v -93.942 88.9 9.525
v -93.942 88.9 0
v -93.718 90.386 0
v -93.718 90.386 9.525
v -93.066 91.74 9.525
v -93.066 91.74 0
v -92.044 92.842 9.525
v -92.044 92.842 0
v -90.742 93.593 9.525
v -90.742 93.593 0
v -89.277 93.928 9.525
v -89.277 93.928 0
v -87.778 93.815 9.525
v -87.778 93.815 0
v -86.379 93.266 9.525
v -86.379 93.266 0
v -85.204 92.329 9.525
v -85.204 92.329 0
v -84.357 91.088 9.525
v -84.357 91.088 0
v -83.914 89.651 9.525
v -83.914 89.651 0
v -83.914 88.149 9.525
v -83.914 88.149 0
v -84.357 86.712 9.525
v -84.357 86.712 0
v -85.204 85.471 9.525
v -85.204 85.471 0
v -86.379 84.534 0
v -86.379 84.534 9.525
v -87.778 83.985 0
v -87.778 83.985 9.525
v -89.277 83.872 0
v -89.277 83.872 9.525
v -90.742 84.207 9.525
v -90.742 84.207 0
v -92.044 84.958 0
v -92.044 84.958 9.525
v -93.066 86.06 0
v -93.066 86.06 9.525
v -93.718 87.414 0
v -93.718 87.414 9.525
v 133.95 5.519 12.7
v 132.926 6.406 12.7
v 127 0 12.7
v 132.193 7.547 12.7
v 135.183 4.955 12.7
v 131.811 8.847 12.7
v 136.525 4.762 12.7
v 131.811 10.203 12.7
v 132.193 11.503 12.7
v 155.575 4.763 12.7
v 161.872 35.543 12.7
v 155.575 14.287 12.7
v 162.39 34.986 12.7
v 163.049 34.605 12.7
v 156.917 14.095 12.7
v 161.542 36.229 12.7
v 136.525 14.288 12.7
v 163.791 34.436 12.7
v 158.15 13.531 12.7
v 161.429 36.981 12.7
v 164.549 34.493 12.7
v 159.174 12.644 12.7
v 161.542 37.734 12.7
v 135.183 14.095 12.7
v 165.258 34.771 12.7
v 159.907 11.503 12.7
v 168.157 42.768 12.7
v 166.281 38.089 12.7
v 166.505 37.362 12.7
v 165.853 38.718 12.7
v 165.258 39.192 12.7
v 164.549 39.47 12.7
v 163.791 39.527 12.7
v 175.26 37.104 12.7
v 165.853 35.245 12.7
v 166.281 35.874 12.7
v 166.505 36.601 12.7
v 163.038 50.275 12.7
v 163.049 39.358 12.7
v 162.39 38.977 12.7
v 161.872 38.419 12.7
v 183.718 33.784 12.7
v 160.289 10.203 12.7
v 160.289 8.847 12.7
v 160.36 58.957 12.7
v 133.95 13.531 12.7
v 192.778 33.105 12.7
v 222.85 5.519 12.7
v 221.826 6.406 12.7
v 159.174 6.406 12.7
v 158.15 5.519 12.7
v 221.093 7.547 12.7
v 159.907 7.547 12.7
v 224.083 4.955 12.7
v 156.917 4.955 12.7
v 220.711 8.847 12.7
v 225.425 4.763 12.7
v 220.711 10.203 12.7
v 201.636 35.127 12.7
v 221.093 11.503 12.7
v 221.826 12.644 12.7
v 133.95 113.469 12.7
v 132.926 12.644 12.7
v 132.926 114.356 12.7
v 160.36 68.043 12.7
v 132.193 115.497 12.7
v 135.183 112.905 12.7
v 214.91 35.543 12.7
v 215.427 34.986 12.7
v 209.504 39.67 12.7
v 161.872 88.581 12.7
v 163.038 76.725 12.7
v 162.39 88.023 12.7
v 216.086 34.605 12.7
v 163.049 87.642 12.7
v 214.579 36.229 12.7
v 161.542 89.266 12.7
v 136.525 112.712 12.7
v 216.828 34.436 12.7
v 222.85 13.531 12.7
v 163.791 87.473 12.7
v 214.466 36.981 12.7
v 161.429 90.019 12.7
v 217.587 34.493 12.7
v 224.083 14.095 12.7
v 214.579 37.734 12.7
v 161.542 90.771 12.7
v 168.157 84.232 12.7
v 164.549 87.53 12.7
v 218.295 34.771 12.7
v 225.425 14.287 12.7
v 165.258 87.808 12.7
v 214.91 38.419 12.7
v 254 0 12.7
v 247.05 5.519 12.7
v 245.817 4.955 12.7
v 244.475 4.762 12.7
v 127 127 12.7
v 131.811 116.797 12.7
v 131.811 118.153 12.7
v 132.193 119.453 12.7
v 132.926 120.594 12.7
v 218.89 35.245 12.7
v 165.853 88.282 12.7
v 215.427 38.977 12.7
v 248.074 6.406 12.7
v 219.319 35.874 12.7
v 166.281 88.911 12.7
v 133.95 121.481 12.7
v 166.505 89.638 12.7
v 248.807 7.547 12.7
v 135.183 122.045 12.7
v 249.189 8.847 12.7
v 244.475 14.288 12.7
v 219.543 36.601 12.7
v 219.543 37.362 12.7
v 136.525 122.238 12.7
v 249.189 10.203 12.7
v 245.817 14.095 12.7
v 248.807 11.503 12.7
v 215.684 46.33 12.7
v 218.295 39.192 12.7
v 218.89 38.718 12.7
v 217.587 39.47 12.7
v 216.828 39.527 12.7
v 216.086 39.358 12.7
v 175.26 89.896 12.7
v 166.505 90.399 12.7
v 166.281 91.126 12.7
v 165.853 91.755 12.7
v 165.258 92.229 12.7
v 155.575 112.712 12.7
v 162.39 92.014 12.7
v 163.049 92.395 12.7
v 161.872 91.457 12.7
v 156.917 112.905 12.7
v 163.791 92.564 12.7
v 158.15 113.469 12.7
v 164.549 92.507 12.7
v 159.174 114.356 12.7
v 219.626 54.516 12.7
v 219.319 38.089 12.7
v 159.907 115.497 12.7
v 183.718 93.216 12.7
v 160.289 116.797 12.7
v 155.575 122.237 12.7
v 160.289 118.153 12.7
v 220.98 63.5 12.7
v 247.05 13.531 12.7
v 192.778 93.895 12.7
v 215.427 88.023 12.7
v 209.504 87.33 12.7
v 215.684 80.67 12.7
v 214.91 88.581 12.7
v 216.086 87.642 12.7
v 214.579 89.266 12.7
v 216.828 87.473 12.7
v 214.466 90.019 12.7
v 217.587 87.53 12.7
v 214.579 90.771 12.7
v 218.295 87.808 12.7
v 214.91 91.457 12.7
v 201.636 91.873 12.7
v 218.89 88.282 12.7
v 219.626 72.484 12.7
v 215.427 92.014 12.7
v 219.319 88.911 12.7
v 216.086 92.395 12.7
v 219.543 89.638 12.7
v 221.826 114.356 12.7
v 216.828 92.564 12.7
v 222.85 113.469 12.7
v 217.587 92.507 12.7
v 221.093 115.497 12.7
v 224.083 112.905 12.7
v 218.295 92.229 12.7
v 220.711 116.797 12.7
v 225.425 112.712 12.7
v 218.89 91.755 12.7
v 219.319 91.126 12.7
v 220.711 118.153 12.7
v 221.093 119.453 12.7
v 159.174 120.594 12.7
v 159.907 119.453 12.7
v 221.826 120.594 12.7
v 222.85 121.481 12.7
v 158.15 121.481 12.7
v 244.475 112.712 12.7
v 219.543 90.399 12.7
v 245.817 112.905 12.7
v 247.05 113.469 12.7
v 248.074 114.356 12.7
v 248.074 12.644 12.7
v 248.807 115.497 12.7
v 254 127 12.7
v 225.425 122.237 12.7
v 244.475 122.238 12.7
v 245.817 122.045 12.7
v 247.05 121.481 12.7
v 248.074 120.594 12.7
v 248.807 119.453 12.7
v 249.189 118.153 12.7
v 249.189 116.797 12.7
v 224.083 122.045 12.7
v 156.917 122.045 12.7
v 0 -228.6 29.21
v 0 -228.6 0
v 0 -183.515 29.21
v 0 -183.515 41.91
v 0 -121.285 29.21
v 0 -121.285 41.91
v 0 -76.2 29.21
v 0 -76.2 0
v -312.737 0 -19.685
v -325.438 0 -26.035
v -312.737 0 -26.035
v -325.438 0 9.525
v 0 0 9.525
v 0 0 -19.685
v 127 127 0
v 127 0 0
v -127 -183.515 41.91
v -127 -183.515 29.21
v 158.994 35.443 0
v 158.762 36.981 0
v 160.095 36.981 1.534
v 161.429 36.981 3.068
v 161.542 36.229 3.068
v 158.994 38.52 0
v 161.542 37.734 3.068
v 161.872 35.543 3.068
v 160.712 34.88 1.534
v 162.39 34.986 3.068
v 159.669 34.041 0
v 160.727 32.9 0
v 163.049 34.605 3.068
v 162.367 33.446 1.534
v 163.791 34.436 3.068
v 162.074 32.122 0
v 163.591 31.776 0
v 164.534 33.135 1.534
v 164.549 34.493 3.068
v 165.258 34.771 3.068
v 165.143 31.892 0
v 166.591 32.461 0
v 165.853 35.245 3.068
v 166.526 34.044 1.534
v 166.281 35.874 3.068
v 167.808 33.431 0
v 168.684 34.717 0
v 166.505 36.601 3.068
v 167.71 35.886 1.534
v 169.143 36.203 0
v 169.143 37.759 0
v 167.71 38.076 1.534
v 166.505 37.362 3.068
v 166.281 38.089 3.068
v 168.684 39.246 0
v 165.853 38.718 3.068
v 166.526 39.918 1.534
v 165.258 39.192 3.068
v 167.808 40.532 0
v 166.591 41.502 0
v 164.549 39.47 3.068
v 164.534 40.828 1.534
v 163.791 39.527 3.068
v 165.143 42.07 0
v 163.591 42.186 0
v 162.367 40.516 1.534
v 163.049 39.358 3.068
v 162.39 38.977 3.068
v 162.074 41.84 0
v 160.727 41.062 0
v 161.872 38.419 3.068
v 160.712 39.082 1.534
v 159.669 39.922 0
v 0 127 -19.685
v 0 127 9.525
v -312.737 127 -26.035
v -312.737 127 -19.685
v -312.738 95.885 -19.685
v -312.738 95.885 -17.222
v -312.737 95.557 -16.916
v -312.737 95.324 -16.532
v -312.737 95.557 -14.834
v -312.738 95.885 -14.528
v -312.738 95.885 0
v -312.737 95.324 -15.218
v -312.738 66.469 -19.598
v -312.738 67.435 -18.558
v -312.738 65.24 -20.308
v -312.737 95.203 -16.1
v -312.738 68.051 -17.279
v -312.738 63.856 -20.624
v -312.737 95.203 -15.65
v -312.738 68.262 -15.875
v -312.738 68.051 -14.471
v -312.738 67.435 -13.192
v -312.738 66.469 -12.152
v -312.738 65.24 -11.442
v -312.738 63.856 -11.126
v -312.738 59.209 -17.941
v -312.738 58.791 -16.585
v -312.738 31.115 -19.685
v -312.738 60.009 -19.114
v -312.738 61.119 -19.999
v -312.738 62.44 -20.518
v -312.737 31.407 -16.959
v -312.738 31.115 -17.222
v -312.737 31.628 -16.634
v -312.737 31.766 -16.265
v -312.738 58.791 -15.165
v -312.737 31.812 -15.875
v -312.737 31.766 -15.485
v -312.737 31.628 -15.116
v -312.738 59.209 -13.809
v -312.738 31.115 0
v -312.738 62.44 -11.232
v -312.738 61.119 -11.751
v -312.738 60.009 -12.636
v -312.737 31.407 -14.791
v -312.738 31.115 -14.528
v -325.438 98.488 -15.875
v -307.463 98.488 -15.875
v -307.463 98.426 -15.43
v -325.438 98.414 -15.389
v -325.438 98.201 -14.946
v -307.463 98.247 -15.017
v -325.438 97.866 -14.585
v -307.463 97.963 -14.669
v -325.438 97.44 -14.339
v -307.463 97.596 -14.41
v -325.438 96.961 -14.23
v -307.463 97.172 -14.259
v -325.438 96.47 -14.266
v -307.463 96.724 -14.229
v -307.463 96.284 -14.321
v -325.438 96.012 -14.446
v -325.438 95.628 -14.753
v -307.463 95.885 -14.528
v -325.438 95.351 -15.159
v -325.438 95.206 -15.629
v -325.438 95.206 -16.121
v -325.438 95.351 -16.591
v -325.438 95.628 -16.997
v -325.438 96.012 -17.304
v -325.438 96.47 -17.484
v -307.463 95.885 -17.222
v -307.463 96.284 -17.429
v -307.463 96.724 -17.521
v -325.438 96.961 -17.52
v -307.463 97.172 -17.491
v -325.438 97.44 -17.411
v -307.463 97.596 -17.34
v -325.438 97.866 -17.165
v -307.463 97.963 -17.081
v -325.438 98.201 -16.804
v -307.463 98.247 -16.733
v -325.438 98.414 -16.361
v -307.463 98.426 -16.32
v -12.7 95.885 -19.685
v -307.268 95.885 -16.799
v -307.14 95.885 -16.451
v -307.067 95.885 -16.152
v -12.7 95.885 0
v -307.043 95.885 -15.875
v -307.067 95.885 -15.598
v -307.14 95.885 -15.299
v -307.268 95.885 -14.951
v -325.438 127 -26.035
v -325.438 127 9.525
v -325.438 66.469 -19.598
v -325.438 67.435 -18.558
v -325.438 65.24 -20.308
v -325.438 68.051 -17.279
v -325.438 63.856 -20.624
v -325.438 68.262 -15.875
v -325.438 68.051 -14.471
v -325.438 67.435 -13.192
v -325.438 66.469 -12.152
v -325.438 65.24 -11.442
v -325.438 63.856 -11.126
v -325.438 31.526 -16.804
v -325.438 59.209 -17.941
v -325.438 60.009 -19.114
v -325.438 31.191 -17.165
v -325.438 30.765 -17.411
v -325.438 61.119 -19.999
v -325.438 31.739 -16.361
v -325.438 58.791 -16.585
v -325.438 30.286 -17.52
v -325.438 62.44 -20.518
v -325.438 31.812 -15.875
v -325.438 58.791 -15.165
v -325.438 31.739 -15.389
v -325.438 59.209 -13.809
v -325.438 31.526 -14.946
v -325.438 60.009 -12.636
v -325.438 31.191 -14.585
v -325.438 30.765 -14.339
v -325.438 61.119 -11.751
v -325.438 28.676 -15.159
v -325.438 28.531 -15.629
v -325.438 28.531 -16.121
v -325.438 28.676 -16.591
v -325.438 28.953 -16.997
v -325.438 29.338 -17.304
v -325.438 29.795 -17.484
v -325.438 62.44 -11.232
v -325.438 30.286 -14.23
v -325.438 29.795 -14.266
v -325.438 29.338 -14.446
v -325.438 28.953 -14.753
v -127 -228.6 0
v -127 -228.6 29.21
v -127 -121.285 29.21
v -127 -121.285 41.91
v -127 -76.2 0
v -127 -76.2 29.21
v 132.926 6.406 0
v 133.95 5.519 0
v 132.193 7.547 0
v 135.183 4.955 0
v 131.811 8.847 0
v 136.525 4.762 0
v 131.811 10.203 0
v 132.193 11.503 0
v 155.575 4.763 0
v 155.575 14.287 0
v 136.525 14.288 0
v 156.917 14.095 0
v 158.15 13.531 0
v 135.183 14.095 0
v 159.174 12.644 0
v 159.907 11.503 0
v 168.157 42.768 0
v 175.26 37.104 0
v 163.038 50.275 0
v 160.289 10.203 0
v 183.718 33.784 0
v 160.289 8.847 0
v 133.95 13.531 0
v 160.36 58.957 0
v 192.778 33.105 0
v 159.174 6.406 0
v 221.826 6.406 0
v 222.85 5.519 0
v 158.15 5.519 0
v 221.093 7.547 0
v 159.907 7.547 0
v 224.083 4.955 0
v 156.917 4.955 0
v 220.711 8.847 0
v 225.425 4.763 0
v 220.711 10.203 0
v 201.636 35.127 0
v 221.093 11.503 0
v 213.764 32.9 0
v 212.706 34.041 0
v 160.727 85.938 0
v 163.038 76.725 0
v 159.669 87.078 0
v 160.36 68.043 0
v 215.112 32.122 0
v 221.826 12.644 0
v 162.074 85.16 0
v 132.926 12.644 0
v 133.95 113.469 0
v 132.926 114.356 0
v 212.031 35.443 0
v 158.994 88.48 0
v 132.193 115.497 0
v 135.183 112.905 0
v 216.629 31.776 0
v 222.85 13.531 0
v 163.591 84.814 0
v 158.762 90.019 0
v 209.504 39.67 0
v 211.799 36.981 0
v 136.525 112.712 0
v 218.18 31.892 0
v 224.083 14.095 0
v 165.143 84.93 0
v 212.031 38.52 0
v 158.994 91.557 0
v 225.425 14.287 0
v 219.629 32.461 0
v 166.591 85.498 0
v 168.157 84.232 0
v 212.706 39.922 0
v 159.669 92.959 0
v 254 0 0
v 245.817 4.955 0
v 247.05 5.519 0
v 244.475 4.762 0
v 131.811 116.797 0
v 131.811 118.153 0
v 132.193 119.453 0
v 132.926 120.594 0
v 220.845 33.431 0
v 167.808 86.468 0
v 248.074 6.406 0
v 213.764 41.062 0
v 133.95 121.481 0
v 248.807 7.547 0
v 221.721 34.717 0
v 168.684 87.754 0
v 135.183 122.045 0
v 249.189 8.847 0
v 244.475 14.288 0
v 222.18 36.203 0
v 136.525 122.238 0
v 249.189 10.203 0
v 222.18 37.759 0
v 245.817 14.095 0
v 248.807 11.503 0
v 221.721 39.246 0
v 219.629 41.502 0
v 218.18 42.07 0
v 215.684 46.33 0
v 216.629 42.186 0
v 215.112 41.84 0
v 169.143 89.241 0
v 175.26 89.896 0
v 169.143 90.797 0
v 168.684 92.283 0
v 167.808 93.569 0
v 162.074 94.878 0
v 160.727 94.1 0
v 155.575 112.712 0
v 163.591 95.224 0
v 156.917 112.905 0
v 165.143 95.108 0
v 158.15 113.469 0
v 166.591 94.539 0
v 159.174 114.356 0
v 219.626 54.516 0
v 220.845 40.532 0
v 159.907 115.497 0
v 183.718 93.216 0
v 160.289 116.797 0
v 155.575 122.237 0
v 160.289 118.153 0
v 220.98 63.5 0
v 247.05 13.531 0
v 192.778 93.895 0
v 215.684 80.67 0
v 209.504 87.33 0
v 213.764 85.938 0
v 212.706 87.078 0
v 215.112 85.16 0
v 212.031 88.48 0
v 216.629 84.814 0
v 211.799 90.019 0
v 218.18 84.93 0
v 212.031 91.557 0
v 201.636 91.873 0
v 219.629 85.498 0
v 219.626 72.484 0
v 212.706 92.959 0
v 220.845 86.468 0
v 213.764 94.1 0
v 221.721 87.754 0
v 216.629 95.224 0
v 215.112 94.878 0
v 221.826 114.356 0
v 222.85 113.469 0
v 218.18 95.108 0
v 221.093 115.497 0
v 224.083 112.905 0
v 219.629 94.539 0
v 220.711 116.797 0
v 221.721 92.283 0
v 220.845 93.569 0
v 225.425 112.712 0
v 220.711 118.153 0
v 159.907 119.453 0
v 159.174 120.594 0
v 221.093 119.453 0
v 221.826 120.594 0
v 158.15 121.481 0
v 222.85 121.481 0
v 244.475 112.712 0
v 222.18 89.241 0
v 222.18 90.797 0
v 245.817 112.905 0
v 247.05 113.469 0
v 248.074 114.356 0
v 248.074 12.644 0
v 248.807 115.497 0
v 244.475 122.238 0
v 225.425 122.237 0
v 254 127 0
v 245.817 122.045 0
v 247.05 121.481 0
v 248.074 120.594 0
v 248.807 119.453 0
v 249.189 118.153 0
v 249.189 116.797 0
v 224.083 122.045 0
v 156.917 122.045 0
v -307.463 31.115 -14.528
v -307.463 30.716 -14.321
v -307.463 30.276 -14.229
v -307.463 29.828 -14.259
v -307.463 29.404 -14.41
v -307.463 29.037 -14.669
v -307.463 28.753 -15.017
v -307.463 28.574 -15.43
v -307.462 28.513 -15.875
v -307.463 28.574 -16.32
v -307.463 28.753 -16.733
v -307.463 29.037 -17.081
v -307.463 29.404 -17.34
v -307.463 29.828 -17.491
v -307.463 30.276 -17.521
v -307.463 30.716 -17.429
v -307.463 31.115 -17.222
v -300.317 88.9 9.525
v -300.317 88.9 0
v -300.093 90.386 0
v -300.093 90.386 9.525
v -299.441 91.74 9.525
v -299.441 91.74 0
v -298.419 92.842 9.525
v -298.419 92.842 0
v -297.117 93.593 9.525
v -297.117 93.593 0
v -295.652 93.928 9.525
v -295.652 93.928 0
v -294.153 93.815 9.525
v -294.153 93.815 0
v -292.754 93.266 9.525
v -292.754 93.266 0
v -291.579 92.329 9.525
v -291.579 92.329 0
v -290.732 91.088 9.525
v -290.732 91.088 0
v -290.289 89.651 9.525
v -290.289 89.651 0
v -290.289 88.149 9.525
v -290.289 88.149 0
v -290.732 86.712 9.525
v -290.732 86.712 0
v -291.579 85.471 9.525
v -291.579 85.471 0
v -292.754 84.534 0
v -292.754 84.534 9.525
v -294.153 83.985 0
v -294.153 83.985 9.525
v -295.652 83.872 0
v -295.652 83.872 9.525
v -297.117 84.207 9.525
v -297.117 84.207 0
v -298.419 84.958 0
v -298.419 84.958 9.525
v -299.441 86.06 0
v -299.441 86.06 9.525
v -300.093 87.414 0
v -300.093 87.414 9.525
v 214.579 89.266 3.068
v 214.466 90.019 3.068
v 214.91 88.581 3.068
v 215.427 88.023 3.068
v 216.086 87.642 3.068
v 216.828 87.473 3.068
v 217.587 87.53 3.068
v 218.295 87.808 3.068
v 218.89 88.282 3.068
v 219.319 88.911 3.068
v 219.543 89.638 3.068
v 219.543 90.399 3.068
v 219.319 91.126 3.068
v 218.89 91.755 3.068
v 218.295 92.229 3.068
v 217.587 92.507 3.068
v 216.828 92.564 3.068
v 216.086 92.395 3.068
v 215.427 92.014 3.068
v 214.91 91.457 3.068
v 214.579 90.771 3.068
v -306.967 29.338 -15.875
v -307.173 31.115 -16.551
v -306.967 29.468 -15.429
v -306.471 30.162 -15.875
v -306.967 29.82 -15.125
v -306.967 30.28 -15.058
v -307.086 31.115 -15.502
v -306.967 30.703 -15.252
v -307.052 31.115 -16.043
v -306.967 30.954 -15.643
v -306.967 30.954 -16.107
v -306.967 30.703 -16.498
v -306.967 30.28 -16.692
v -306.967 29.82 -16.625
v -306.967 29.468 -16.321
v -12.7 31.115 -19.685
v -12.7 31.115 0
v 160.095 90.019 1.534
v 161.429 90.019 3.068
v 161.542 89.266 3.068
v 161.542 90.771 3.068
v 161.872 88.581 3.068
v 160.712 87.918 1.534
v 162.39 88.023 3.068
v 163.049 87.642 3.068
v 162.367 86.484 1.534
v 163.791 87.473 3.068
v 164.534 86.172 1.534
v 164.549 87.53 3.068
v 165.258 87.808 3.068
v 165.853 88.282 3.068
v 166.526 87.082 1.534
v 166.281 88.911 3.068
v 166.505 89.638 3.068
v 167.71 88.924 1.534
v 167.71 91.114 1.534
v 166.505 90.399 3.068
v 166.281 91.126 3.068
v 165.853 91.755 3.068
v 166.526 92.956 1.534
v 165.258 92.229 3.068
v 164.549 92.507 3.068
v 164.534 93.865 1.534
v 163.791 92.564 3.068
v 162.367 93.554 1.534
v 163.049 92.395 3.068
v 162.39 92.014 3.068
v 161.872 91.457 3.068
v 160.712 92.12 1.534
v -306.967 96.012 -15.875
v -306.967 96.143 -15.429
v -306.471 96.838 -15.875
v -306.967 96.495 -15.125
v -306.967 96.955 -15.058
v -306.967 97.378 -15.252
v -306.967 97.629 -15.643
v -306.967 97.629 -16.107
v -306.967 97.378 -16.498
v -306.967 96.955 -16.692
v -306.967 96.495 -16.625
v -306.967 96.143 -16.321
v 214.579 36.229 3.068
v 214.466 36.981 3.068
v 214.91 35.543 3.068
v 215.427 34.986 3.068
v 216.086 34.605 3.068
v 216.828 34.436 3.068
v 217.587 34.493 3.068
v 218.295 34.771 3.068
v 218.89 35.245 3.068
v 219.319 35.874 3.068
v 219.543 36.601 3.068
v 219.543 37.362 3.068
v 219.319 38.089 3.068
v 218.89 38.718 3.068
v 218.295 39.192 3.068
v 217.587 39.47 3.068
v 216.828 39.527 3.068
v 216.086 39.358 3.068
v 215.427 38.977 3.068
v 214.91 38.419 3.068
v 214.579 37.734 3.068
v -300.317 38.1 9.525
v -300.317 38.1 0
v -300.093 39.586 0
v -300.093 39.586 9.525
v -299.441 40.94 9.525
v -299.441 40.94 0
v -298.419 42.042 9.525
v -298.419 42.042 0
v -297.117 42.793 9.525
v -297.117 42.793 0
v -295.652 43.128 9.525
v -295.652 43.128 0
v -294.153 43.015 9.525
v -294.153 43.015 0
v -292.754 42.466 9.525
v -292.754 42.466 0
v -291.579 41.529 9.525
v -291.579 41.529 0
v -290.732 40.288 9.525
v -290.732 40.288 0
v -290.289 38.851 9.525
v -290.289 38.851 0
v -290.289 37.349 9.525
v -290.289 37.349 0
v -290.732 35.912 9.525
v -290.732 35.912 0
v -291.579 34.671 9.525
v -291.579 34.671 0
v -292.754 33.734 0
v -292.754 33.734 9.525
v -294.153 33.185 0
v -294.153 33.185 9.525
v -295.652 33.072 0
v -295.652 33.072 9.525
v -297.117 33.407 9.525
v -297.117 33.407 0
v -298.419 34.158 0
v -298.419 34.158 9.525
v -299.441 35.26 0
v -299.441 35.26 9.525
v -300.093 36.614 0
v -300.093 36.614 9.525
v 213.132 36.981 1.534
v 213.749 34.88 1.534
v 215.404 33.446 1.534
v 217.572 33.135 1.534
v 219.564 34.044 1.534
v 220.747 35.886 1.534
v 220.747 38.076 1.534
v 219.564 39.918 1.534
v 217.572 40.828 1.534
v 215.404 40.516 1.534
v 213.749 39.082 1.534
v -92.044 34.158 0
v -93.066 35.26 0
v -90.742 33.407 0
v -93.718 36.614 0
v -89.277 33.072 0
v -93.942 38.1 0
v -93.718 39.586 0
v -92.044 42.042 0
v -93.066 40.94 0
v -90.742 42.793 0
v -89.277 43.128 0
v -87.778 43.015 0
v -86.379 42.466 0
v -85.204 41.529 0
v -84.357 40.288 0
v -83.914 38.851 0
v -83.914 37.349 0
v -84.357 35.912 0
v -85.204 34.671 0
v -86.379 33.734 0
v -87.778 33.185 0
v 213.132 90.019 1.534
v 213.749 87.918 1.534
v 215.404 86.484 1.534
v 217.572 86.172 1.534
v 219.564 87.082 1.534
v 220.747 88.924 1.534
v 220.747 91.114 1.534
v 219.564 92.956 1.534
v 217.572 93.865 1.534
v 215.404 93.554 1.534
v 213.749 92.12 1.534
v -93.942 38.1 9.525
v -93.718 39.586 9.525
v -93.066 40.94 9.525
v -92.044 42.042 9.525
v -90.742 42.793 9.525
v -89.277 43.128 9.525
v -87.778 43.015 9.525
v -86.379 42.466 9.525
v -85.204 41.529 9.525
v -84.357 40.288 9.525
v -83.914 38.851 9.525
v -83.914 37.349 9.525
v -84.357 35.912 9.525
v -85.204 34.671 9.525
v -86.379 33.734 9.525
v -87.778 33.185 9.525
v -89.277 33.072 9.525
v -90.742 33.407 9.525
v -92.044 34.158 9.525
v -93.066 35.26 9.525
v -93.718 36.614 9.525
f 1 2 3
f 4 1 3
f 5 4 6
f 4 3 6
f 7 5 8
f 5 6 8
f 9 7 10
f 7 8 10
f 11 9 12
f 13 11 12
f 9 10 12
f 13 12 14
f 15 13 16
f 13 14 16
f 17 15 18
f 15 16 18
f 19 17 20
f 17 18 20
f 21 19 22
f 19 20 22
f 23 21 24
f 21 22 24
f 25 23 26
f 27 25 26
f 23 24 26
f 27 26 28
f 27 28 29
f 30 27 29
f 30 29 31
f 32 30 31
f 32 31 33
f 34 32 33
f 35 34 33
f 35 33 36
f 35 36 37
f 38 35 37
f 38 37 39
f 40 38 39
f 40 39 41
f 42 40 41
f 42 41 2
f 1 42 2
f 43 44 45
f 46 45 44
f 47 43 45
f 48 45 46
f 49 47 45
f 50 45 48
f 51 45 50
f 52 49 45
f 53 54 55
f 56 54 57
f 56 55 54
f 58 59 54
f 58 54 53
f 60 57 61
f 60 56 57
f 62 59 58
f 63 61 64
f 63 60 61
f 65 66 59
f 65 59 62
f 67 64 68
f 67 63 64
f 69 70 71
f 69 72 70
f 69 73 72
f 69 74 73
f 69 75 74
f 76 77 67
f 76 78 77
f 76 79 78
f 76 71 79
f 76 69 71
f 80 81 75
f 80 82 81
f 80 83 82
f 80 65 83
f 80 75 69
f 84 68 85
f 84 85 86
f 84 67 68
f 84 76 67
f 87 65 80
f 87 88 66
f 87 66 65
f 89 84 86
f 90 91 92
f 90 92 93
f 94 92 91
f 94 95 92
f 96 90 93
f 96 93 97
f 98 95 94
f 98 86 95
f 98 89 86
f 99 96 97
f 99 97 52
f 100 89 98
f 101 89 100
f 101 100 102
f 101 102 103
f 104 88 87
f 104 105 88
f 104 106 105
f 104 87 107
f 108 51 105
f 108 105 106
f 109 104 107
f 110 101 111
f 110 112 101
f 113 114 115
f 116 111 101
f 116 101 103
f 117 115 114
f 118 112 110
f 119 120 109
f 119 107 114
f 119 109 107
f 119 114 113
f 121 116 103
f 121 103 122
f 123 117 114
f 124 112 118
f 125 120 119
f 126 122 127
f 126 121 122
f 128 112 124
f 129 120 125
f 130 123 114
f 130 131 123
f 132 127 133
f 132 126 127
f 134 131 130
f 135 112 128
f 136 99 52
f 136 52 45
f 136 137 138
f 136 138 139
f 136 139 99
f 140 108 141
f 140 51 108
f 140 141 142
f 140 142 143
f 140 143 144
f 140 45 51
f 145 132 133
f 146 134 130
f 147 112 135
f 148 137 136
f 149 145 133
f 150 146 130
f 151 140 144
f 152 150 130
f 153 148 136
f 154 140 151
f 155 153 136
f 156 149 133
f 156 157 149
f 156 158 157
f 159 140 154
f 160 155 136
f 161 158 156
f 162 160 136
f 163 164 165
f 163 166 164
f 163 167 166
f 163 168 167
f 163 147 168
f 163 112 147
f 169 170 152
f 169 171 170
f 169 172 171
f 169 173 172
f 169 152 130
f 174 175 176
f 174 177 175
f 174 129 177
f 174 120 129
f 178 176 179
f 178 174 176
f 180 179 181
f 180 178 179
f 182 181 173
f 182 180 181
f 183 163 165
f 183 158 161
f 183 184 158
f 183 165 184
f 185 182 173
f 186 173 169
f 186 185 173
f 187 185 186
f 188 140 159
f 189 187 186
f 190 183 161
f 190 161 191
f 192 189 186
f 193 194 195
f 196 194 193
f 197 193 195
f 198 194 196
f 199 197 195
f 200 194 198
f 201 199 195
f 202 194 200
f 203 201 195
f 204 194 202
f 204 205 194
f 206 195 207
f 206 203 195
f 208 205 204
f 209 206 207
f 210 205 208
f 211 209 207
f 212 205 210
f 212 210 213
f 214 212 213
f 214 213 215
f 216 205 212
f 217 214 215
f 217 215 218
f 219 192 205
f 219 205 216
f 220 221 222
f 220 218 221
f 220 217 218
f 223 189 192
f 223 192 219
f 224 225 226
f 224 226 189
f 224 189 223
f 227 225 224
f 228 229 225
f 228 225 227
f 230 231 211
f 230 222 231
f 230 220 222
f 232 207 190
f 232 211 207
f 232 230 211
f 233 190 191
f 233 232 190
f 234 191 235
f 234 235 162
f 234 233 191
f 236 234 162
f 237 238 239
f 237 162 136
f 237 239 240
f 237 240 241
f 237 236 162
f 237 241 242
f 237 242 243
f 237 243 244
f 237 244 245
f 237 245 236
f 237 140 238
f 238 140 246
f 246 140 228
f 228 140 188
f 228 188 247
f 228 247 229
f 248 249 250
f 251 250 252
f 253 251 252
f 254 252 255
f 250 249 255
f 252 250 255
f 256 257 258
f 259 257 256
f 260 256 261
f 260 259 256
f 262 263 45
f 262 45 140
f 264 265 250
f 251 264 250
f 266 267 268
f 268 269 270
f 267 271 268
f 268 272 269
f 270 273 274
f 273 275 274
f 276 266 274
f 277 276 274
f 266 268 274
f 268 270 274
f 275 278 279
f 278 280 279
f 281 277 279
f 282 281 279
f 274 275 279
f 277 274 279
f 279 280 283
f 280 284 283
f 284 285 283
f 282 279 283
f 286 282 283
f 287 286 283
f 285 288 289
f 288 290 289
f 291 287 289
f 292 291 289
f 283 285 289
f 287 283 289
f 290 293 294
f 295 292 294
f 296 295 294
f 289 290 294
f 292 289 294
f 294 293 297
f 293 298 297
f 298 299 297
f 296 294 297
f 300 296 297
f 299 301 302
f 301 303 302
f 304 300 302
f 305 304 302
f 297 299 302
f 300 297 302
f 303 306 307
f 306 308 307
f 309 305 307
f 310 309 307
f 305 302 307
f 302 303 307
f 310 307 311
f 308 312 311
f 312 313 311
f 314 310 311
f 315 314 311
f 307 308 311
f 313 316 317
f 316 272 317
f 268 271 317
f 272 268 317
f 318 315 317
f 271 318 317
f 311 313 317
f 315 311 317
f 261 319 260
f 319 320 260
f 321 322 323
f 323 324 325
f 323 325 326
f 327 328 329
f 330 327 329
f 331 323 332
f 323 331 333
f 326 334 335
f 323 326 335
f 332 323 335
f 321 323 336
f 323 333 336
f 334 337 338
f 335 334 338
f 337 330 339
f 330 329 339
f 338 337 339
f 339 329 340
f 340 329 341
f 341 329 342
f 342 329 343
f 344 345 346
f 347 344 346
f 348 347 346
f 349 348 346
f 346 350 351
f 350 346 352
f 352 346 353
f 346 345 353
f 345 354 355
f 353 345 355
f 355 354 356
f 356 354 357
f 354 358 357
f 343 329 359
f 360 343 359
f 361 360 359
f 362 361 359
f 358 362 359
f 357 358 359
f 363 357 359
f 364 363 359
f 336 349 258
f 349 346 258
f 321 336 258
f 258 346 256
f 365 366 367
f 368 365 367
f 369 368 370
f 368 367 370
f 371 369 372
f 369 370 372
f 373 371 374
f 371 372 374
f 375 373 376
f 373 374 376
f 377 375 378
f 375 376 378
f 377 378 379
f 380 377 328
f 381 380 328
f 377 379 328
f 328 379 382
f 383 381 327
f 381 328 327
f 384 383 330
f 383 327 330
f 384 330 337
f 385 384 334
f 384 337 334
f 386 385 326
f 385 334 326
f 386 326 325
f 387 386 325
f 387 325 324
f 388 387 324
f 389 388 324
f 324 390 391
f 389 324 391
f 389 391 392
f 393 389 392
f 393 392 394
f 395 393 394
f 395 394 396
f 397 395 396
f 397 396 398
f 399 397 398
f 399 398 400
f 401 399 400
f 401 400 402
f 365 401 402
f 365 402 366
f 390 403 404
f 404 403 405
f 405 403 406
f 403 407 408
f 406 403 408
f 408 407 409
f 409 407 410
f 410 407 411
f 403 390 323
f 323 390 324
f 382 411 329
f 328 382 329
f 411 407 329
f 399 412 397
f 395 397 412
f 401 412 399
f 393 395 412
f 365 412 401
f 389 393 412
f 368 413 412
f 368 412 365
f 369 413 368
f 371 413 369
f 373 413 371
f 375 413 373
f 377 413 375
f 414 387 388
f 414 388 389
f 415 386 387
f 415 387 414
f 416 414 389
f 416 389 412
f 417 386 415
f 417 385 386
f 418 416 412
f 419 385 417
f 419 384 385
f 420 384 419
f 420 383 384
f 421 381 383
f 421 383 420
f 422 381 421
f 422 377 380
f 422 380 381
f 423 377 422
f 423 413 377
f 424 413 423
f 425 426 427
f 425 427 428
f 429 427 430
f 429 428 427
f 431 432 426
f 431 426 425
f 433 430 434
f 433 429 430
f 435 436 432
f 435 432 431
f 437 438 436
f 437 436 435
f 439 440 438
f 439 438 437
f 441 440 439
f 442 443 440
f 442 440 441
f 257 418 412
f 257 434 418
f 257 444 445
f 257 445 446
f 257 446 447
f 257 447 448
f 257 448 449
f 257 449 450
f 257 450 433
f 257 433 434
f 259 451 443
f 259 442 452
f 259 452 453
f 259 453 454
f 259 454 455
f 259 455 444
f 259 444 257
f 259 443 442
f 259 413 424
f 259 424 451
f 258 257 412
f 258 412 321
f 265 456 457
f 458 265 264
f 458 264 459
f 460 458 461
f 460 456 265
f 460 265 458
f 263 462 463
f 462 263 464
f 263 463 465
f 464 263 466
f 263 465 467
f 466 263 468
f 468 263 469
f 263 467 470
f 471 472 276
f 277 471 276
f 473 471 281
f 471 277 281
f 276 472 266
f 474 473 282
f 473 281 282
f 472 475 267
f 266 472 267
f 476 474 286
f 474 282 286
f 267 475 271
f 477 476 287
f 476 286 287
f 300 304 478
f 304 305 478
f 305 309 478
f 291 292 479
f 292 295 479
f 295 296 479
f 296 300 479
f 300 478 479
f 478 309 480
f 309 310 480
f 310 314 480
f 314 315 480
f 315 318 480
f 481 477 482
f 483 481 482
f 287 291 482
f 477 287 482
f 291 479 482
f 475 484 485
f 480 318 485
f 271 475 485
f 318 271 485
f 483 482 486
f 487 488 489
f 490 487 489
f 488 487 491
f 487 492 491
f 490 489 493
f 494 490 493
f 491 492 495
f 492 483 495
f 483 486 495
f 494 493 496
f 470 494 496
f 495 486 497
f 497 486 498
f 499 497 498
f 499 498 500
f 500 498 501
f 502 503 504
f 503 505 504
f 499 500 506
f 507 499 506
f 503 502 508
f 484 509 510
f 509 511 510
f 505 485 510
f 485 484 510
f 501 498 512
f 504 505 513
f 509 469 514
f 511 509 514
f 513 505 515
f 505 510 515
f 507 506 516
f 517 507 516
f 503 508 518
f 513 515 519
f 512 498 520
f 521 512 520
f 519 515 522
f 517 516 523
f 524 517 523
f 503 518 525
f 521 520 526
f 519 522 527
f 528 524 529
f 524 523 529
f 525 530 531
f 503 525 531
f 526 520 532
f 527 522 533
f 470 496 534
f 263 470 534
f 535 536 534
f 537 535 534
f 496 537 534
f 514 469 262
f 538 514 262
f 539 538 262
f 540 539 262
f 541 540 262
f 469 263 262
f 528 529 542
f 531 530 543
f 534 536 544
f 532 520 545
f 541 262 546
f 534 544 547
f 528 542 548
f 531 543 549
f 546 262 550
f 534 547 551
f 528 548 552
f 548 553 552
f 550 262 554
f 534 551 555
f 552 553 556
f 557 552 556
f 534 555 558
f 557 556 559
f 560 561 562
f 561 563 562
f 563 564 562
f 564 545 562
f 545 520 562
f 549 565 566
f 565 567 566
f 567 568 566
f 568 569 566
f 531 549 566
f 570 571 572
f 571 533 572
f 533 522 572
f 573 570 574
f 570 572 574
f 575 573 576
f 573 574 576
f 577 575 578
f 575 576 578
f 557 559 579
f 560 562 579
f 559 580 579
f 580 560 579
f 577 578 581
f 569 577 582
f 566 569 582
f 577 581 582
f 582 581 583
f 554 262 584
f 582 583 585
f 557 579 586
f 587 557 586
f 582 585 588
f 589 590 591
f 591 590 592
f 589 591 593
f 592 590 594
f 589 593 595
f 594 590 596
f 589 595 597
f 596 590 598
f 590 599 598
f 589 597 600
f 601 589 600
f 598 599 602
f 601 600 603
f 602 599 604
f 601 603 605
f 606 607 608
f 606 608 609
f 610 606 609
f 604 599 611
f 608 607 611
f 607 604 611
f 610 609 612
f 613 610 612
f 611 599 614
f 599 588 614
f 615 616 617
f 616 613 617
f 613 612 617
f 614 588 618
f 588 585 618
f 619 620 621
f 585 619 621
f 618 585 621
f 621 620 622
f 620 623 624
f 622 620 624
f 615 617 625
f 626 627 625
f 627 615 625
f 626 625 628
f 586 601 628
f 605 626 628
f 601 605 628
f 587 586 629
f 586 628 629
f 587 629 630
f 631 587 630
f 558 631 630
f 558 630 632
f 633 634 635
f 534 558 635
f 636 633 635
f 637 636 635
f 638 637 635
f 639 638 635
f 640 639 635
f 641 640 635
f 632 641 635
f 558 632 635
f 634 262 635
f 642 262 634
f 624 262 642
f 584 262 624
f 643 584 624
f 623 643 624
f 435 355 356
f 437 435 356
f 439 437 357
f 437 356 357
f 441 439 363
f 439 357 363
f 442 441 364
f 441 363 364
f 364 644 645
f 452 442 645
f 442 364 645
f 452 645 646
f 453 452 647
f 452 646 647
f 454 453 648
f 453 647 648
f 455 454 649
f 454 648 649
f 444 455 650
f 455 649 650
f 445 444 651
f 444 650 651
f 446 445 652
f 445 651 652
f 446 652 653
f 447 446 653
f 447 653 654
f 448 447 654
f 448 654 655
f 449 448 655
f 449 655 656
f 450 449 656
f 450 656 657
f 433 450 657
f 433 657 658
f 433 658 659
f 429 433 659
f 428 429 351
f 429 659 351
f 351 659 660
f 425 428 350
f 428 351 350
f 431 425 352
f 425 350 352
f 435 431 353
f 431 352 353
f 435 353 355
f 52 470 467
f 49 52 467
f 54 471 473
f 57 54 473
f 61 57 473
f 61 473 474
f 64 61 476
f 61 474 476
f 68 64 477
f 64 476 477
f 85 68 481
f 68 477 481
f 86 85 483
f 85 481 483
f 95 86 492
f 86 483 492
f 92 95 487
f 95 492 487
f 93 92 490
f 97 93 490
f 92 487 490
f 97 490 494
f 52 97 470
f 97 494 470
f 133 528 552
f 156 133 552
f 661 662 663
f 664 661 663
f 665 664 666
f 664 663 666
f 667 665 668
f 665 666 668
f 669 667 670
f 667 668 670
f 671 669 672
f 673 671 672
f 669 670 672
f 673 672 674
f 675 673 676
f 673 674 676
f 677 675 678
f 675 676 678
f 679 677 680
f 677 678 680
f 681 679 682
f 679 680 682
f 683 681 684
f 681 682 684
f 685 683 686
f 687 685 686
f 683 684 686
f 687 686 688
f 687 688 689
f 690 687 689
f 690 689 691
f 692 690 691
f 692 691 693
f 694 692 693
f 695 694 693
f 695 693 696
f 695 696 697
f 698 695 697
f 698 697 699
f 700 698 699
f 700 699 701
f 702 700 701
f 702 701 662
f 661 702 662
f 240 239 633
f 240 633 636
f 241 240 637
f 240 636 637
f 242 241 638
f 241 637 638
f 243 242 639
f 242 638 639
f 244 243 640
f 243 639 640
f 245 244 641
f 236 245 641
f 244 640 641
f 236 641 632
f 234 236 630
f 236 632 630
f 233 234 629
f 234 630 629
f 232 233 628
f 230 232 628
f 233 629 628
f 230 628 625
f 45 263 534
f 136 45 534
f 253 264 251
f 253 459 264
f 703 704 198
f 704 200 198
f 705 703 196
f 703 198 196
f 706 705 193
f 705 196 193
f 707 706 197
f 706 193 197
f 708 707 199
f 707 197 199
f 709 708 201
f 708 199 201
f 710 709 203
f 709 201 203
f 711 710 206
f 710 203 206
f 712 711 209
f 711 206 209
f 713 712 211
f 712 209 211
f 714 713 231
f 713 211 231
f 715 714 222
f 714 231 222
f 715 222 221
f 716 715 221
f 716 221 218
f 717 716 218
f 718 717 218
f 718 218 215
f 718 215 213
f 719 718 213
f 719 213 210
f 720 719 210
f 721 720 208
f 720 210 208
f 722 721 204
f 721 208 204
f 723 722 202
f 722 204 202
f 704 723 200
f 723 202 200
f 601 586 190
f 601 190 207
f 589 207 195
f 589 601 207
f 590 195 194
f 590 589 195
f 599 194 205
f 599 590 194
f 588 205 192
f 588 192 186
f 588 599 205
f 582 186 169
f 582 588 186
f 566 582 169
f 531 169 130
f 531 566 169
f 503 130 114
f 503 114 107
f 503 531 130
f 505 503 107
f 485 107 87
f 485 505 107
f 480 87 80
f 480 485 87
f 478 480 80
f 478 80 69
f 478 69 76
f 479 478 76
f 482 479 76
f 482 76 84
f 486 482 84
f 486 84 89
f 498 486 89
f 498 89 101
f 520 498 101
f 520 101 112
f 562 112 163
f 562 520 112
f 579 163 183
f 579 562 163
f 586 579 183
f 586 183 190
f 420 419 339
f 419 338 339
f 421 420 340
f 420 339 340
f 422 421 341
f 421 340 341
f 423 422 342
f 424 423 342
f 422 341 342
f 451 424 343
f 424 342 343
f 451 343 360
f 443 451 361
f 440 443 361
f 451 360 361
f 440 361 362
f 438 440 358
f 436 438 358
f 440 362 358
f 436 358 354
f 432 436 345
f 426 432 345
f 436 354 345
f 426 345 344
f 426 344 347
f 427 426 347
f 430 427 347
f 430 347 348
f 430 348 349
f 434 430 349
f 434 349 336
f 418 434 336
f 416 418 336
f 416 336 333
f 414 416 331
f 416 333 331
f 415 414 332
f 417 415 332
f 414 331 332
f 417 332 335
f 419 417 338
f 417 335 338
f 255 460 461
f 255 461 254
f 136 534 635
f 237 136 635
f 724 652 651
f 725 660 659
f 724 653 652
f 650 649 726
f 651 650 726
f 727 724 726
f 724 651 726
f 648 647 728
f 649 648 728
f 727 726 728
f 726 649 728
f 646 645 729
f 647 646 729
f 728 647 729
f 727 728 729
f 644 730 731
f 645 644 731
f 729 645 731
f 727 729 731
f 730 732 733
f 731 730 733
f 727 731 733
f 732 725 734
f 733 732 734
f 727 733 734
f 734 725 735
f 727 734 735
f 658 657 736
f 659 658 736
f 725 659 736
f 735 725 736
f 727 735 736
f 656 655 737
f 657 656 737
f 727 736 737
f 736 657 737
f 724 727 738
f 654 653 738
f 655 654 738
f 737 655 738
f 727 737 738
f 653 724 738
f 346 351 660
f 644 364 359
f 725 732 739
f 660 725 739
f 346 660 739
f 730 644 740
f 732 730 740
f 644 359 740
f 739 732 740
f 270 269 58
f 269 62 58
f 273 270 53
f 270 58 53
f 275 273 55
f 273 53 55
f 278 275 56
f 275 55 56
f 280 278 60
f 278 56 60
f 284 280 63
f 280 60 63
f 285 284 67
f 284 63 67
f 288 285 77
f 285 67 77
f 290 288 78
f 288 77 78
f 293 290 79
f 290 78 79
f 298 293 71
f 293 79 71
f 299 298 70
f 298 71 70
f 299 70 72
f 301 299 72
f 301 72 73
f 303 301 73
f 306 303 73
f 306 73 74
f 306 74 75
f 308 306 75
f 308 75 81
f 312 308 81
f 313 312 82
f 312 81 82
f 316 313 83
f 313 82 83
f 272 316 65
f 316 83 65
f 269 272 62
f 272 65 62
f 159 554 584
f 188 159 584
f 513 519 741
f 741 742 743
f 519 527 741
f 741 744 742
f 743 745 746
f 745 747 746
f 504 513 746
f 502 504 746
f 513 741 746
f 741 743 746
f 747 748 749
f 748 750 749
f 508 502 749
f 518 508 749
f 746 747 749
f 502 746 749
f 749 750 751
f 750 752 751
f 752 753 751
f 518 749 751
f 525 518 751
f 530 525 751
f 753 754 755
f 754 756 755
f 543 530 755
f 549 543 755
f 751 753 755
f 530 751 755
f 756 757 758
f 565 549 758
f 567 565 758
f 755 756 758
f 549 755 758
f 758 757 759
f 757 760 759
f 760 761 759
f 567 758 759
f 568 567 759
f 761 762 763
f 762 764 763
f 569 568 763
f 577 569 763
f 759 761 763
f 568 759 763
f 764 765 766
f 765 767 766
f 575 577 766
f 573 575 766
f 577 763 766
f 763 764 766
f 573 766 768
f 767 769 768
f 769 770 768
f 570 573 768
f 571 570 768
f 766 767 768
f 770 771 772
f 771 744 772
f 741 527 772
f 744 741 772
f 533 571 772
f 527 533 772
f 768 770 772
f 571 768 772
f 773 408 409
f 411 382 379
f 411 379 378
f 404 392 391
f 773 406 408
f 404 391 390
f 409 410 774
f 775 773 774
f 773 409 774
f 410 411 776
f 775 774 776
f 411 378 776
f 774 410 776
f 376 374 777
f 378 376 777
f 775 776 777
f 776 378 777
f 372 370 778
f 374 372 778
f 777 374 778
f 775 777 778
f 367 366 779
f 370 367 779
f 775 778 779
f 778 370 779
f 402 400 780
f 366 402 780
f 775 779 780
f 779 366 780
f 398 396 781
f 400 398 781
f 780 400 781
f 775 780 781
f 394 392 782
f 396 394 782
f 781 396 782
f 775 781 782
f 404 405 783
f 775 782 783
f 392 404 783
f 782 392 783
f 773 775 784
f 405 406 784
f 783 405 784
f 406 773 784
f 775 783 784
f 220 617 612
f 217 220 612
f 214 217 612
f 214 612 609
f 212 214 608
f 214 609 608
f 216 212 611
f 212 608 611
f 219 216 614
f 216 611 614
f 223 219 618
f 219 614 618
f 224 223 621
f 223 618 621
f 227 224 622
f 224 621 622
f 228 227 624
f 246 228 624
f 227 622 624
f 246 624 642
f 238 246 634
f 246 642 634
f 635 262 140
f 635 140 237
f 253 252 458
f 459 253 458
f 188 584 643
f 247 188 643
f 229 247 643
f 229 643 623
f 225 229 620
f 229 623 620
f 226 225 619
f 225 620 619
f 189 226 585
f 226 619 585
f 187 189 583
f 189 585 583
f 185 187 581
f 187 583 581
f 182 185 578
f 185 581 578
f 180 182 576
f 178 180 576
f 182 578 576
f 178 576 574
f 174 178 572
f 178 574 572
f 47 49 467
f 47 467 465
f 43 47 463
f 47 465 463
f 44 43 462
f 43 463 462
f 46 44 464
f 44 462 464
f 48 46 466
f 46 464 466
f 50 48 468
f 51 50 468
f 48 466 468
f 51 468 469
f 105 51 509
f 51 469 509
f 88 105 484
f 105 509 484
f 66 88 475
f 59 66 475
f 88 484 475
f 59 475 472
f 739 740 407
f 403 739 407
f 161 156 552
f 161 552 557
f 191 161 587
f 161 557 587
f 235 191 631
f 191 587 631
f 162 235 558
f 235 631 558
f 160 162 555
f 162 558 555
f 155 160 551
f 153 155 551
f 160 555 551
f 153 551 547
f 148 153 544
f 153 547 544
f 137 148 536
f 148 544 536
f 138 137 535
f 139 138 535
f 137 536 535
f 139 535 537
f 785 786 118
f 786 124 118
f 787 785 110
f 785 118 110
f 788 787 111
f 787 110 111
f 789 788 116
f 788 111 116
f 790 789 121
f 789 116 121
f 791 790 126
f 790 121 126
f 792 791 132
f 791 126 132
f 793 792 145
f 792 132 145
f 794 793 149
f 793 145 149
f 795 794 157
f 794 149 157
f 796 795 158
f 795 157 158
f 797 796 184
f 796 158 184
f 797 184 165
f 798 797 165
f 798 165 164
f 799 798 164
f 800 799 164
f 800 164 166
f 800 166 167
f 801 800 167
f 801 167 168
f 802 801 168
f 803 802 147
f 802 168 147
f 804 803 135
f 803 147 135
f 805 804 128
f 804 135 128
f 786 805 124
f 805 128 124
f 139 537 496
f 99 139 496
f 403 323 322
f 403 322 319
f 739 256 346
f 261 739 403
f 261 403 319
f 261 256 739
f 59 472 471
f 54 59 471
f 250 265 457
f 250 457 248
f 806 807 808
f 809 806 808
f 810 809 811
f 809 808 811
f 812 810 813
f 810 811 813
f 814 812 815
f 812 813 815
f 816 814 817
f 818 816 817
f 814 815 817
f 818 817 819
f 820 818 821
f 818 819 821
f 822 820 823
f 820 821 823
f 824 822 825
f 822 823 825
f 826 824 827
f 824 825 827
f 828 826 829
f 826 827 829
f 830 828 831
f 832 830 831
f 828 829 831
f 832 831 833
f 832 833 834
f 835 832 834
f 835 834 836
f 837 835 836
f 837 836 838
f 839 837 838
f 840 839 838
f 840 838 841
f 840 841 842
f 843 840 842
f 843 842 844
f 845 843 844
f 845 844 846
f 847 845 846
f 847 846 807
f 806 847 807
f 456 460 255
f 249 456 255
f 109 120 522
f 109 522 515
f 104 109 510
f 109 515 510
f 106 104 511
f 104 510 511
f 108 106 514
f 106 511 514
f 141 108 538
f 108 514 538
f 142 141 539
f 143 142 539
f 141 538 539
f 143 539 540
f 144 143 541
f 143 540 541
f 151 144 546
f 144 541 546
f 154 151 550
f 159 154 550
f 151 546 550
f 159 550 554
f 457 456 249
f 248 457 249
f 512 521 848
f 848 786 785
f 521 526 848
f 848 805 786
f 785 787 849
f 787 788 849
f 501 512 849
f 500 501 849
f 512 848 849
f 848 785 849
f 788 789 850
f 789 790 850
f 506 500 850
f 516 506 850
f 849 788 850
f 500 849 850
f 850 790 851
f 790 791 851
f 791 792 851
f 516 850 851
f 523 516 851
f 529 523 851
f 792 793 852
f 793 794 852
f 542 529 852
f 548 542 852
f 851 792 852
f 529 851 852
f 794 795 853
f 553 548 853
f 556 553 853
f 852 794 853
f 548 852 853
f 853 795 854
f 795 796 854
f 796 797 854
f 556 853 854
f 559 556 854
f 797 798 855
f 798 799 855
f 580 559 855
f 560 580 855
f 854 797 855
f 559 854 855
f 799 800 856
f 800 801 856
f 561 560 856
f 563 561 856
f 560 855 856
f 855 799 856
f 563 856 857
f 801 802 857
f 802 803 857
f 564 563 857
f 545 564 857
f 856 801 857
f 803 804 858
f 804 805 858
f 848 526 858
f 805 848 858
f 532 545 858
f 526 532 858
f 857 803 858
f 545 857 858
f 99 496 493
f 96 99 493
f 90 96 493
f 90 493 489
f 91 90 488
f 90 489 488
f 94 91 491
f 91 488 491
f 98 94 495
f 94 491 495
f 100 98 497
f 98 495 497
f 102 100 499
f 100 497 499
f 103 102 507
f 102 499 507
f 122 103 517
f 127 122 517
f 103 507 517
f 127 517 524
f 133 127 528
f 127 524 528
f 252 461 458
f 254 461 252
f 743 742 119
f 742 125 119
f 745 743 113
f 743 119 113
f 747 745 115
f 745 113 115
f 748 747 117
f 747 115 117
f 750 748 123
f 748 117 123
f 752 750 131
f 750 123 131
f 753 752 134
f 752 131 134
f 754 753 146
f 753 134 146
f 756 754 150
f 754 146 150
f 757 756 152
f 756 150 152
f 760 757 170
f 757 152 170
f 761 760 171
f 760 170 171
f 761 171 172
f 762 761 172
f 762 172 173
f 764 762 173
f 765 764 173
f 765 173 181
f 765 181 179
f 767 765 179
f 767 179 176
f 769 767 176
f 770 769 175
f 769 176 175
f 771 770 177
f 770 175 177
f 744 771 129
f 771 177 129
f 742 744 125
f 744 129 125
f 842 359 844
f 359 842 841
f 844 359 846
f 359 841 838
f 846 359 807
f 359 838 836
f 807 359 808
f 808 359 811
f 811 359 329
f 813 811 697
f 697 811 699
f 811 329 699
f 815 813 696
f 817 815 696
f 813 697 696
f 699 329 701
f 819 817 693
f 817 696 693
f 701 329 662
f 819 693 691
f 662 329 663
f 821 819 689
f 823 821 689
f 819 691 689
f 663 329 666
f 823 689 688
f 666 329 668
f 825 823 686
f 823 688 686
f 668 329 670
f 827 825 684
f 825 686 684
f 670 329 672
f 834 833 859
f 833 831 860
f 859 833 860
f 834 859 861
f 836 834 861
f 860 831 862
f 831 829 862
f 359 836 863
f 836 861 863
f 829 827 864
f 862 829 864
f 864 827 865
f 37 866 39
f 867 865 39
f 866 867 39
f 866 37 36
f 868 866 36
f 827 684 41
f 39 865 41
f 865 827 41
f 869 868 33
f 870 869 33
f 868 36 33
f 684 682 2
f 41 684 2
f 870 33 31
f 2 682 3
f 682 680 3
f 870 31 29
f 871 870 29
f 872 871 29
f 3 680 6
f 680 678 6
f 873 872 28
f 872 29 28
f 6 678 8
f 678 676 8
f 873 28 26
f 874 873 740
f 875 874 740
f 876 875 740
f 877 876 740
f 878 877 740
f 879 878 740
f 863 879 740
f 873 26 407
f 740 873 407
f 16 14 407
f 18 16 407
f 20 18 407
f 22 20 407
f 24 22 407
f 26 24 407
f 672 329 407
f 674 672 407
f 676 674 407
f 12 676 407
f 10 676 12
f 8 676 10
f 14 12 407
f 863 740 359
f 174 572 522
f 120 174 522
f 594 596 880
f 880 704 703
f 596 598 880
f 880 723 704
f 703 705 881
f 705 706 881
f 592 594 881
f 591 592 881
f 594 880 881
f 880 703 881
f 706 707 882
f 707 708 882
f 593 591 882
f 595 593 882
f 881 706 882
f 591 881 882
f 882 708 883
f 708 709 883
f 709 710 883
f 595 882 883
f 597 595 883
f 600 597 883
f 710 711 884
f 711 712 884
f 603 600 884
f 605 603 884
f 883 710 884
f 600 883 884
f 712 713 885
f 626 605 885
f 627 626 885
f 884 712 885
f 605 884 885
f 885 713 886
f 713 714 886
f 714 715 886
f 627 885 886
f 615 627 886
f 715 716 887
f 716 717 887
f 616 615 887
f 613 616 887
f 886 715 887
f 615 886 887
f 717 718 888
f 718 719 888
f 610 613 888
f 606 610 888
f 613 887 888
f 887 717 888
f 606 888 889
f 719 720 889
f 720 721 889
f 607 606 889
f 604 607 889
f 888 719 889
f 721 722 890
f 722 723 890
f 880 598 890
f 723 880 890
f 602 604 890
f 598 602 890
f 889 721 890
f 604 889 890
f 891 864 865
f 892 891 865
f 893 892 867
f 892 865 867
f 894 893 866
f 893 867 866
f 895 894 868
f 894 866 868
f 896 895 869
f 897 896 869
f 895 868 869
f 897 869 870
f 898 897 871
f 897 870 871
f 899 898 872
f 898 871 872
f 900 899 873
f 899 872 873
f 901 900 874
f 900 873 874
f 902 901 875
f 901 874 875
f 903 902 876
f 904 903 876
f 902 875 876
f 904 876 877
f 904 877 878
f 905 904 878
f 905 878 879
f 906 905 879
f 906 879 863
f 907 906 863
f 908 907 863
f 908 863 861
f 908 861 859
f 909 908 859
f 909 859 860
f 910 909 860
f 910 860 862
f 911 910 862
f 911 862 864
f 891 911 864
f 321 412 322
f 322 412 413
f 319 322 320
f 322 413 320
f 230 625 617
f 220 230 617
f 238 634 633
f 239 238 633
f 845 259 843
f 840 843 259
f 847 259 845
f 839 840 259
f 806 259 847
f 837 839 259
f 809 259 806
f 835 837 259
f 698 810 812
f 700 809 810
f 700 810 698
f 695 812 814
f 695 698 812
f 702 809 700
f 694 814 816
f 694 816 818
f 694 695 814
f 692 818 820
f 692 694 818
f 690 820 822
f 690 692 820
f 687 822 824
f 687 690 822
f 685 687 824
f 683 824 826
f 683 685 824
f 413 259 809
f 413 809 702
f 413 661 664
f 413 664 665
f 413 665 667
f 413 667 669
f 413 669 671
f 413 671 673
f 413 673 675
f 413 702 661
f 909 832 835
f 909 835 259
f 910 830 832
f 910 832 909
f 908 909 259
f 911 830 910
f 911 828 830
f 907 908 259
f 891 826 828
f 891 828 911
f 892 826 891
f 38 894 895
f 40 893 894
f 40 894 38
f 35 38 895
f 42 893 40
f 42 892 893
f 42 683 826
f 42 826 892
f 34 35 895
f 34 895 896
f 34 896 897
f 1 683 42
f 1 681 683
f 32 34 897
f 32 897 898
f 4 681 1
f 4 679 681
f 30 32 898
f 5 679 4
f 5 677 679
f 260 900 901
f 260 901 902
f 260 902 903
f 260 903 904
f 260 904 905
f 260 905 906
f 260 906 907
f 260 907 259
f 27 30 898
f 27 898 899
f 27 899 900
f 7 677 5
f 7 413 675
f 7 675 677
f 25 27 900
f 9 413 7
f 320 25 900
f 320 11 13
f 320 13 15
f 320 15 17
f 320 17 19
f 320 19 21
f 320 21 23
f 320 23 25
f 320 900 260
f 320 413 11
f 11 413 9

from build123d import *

# Parameters (mm, degrees)
F0_W            = 325.4375
F0_H            = 127
F1_DEPTH        = 9.525
F2_W            = 300.0375
F2_H            = 31.115
F3_DEPTH        = 19.685
F5_W            = 127
F5_H            = 152.4
F6_DEPTH        = 29.21
F7_W            = 12.7
F7_H            = 127
F8_DEPTH        = 6.35
F9_D            = 9.525
F9_DEPTH        = 12.7
F9_TIP          = 2.8615986981
F11_DEPTH       = 12.7
F12_W           = 127
F12_H           = 127
F12_R           = 30.48
F13_DEPTH       = 12.7
F14_D           = 5.1054
F14_DEPTH       = 15.875
F14_CSINK_D     = 10.4394
F14_CSINK_ANGLE = 82
F14_TIP         = 1.5338169022
F16_D           = 3.3
F16_DEPTH       = 17.975
F16_TIP         = 0.9914200214
F18_D           = 10.0838
F18_DEPTH       = 20.6248
F18_TIP         = 3.0294791551


with BuildPart() as f1:
    # F0 (on Top) → F1 (new body)
    with BuildSketch(Plane.XY):
        with Locations((-162.71875, 63.5)):
            Rectangle(F0_W, F0_H)
    extrude(amount=F1_DEPTH)

    # F2 (on face) → F3 (join)
    with BuildSketch(Plane(origin=(0, 0, 0), x_dir=(1, 0, 0), z_dir=(0, 0, -1))):
        Polygon((-312.7375, 0), (-325.4375, 0), (-325.4375, -127), (-312.7375, -127), (-312.7375, -95.885), (-312.7375, -31.115), align=None)
        with Locations((-162.71875, -15.5575)):
            Rectangle(F2_W, F2_H)
        Polygon((0, 0), (-12.7, 0), (-12.7, -31.115), (-12.7, -95.885), (-312.7375, -95.885), (-312.7375, -127), (-12.7, -127), (0, -127), align=None)
    extrude(amount=F3_DEPTH)

    # F7 (on face) → F8 (join)
    with BuildSketch(Plane(origin=(0, 0, -19.685), x_dir=(1, 0, 0), z_dir=(0, 0, -1))):
        with Locations((-319.0875, -63.5)):
            Rectangle(F7_W, F7_H)
    extrude(amount=F8_DEPTH)

    # F9
    with Locations(Plane(origin=(-325.4375, 0, 0), x_dir=(0, -1, 0), z_dir=(-1, 0, 0))):
        with Locations((-63.5, -15.875)):
            Hole(F9_D / 2, depth=F9_DEPTH)
            with Locations((0, 0, -(F9_DEPTH + F9_TIP / 2))):  # 118° drill point
                Cone(0, F9_D / 2, F9_TIP, mode=Mode.SUBTRACT)

    # F16
    with Locations(Plane(origin=(-325.4375, 0, 0), x_dir=(0, -1, 0), z_dir=(-1, 0, 0))):
        with Locations((-30.1625, -15.875), (-96.8375, -15.875)):
            Hole(F16_D / 2, depth=F16_DEPTH)
            with Locations((0, 0, -(F16_DEPTH + F16_TIP / 2))):  # 118° drill point
                Cone(0, F16_D / 2, F16_TIP, mode=Mode.SUBTRACT)

    # F18
    with Locations(Plane.XY.offset(9.525)):
        with Locations((-295.275, 38.1), (-295.275, 88.9), (-88.9, 38.1), (-88.9, 88.9)):
            Hole(F18_D / 2, depth=F18_DEPTH)
            with Locations((0, 0, -(F18_DEPTH + F18_TIP / 2))):  # 118° drill point
                Cone(0, F18_D / 2, F18_TIP, mode=Mode.SUBTRACT)


with BuildPart() as f6:
    # F5 (on Top) → F6 (new body)
    with BuildSketch(Plane.XY):
        with Locations((-63.5, -152.4)):
            Rectangle(F5_W, F5_H)
    extrude(amount=F6_DEPTH)

    # F10 (on face) → F11 (join)
    with BuildSketch(Plane.XY.offset(29.21)):
        Polygon((-127, -152.4), (-127, -183.515), (0, -183.515), (0, -152.4), (0, -121.285), (-127, -121.285), align=None)
    extrude(amount=F11_DEPTH)


with BuildPart() as f13:
    # F12 (on Top) → F13 (new body)
    with BuildSketch(Plane.XY):
        with Locations((190.5, 63.5)):
            Rectangle(F12_W, F12_H)
        with BuildLine():
            Line((136.525, 14.2875), (155.575, 14.2875))
            ThreePointArc((155.575, 14.2875), (160.3375, 9.525), (155.575, 4.7625))
            Line((155.575, 4.7625), (136.525, 4.7625))
            ThreePointArc((136.525, 4.7625), (131.7625, 9.525), (136.525, 14.2875))
        make_face(mode=Mode.SUBTRACT)
        with BuildLine():
            ThreePointArc((244.475, 14.2875), (249.2375, 9.525), (244.475, 4.7625))
            Line((244.475, 4.7625), (225.425, 4.7625))
            ThreePointArc((225.425, 4.7625), (220.6625, 9.525), (225.425, 14.2875))
            Line((225.425, 14.2875), (244.475, 14.2875))
        make_face(mode=Mode.SUBTRACT)
        with BuildLine():
            ThreePointArc((136.525, 112.7125), (131.7625, 117.475), (136.525, 122.2375))
            Line((136.525, 122.2375), (155.575, 122.2375))
            ThreePointArc((155.575, 122.2375), (160.3375, 117.475), (155.575, 112.7125))
            Line((155.575, 112.7125), (136.525, 112.7125))
        make_face(mode=Mode.SUBTRACT)
        with Locations((190.5, 63.5)):
            Circle(F12_R, mode=Mode.SUBTRACT)
        with BuildLine():
            Line((244.475, 112.7125), (225.425, 112.7125))
            ThreePointArc((225.425, 112.7125), (220.6625, 117.475), (225.425, 122.2375))
            Line((225.425, 122.2375), (244.475, 122.2375))
            ThreePointArc((244.475, 122.2375), (249.2375, 117.475), (244.475, 112.7125))
        make_face(mode=Mode.SUBTRACT)
    extrude(amount=F13_DEPTH)

    # F14
    with Locations(Plane(origin=(0, 0, 0), x_dir=(1, 0, 0), z_dir=(0, 0, -1))):
        with Locations((217.0186963255, -36.9813036745), (217.0186963255, -90.0186963255), (163.9813036745, -90.0186963255), (163.9813036745, -36.9813036745)):
            CounterSinkHole(F14_D / 2, F14_CSINK_D / 2, depth=F14_DEPTH, counter_sink_angle=F14_CSINK_ANGLE)
            with Locations((0, 0, -(F14_DEPTH + F14_TIP / 2))):  # 118° drill point
                Cone(0, F14_D / 2, F14_TIP, mode=Mode.SUBTRACT)


solid = Compound([f1.part, f6.part, f13.part])
